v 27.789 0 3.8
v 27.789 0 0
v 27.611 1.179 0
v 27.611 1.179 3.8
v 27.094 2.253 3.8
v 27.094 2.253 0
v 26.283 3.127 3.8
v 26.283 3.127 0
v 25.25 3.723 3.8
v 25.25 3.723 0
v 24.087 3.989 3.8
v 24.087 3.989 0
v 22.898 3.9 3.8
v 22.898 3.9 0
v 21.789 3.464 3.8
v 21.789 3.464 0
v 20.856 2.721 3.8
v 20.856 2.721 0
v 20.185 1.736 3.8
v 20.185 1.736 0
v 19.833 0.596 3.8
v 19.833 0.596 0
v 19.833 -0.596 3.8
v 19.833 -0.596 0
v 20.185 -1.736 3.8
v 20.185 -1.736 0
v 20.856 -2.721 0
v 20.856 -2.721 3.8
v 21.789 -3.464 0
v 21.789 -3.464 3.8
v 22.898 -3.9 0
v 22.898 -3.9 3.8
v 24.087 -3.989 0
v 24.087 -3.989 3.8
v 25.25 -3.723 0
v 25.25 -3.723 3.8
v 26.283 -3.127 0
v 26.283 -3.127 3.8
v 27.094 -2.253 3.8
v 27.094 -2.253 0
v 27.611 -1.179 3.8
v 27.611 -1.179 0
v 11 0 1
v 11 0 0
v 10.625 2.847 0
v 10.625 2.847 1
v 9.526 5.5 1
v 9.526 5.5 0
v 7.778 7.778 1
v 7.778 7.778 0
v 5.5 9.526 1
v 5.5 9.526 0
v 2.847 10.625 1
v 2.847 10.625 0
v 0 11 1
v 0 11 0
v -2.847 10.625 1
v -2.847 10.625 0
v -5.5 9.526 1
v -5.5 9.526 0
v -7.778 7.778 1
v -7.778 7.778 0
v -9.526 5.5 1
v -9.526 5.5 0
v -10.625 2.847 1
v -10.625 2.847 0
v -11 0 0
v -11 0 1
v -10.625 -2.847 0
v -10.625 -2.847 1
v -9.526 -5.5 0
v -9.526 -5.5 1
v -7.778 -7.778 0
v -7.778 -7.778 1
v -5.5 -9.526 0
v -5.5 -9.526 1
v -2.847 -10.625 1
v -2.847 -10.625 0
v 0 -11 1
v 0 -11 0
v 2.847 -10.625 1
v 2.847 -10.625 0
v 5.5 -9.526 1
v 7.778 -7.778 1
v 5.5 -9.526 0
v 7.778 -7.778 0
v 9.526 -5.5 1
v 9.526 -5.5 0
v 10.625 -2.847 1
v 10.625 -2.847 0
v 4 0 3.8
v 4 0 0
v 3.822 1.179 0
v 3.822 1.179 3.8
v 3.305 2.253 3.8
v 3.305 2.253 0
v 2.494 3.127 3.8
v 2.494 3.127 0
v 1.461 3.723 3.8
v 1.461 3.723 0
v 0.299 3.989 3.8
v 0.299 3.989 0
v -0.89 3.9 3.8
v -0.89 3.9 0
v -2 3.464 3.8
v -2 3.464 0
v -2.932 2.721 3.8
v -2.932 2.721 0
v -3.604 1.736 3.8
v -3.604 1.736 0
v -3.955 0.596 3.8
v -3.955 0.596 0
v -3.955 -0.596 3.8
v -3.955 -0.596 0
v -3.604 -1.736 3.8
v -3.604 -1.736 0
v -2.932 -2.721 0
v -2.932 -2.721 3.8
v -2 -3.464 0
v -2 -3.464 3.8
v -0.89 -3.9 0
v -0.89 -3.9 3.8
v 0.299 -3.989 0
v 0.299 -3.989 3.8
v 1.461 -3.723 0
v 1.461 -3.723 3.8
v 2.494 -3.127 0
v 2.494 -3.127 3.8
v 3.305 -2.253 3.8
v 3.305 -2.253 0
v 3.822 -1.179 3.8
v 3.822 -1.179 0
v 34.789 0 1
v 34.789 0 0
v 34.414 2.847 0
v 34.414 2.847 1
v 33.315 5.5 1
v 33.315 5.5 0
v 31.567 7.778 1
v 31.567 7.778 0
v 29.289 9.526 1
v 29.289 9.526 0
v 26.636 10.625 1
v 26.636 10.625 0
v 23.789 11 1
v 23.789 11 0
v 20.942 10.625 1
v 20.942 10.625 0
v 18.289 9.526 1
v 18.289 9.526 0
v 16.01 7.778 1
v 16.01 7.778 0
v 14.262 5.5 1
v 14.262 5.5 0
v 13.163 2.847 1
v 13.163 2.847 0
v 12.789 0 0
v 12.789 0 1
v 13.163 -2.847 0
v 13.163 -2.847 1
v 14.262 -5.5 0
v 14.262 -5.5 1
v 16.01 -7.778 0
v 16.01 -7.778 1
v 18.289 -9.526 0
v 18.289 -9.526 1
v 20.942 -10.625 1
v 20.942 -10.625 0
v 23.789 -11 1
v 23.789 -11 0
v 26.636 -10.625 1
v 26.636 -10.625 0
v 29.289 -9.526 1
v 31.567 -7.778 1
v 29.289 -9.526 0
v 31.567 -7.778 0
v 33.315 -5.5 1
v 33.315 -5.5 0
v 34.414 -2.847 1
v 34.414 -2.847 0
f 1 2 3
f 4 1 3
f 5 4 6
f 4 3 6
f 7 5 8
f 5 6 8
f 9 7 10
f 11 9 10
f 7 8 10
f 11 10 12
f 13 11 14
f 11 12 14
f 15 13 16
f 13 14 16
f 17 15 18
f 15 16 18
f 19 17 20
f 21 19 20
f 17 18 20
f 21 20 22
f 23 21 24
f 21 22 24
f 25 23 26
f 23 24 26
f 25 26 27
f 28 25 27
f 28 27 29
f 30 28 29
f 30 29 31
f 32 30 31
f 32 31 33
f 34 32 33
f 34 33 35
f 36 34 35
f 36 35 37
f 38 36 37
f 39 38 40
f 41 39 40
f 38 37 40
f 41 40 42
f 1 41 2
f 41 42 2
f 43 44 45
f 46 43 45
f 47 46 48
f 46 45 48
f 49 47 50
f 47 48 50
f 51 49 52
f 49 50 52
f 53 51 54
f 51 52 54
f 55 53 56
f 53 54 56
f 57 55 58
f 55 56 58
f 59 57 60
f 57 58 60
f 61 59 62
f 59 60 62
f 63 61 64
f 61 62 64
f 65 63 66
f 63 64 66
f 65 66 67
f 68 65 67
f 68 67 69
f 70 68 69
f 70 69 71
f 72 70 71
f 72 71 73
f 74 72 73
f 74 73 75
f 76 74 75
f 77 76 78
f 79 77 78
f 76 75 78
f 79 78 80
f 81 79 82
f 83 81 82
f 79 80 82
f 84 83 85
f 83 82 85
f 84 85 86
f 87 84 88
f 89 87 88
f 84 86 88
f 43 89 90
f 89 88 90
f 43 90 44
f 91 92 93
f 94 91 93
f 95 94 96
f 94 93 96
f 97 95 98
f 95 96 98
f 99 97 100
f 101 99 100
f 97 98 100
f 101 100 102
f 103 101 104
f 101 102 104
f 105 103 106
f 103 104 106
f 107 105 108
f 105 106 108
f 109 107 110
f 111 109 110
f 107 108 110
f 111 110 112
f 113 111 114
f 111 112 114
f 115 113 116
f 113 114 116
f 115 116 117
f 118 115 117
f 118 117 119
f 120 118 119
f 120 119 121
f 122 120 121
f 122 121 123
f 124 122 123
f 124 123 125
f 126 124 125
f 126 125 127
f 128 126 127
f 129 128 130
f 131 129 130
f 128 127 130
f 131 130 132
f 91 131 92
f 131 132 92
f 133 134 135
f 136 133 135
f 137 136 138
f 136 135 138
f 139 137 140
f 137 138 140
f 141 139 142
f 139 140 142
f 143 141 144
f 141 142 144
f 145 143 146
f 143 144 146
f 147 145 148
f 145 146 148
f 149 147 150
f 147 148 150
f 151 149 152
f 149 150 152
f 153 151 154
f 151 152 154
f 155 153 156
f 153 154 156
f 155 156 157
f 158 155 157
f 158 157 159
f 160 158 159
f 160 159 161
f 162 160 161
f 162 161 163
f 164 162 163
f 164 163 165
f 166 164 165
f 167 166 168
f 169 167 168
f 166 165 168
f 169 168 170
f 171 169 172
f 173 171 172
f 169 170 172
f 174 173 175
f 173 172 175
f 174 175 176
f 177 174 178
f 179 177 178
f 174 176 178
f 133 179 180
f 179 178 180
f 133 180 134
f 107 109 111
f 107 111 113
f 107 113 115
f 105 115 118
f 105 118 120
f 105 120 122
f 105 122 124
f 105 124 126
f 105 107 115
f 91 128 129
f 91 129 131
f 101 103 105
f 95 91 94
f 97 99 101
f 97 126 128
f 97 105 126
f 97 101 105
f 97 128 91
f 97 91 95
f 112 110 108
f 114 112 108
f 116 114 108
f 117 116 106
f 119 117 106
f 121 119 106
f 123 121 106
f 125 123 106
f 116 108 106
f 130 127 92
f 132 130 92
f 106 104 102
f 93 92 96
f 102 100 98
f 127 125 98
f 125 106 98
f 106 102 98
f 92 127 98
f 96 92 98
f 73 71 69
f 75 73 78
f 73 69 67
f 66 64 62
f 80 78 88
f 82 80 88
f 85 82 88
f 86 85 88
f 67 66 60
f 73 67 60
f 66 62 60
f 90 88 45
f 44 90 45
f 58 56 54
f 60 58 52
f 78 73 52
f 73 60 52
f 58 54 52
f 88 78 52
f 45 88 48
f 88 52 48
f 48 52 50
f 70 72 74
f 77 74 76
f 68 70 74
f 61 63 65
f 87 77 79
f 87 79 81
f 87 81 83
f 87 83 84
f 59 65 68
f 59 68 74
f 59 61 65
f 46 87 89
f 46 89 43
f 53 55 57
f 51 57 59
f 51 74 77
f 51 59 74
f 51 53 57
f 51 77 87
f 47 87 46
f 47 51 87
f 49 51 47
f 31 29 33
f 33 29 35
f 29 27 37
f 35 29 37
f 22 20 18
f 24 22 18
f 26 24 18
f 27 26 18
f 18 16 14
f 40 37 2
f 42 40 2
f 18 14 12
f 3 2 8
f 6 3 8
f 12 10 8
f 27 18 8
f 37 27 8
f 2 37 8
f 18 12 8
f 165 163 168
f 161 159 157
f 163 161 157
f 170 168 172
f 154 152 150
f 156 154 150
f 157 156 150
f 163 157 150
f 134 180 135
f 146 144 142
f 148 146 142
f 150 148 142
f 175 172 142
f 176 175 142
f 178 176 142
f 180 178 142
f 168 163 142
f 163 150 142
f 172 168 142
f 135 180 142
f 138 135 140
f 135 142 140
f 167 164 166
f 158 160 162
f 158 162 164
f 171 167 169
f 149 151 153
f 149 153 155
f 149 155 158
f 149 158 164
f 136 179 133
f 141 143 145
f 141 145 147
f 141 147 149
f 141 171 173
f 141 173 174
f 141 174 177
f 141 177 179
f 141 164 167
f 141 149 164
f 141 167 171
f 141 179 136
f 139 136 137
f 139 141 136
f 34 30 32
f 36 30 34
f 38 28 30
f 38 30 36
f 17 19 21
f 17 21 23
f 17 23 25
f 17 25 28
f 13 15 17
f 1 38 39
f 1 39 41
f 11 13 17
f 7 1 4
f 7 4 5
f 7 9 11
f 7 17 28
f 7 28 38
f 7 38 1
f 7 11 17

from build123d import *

# Parameters (mm, degrees)
F0_R     = 11
F0_R_2   = 4
F1_DEPTH = 1
F2_DEPTH = 3.8


with BuildPart() as f1:
    # F0 (on Top) → F1 (new body)
    with BuildSketch(Plane.XY):
        with Locations((23.7885564566, 0)):
            Circle(F0_R)
        with Locations((23.7885564566, 0)):
            Circle(F0_R_2, mode=Mode.SUBTRACT)
        with Locations((23.7885564566, 0)):
            Circle(F0_R_2)
    extrude(amount=F1_DEPTH)


with BuildPart() as f1b:
    # F0 (on Top) → F1, piece 2 (new body)
    with BuildSketch(Plane.XY):
        Circle(F0_R)
        Circle(F0_R_2, mode=Mode.SUBTRACT)
        Circle(F0_R_2)
    extrude(amount=F1_DEPTH)


with BuildPart() as f2:
    # F0 (on Top) → F2 (new body)
    with BuildSketch(Plane.XY):
        Circle(F0_R_2)
    extrude(amount=F2_DEPTH)


with BuildPart() as f2b:
    # F0 (on Top) → F2, piece 2 (new body)
    with BuildSketch(Plane.XY):
        with Locations((23.7885564566, 0)):
            Circle(F0_R_2)
    extrude(amount=F2_DEPTH)


solid = Compound([f1.part, f1b.part, f2.part, f2b.part])
